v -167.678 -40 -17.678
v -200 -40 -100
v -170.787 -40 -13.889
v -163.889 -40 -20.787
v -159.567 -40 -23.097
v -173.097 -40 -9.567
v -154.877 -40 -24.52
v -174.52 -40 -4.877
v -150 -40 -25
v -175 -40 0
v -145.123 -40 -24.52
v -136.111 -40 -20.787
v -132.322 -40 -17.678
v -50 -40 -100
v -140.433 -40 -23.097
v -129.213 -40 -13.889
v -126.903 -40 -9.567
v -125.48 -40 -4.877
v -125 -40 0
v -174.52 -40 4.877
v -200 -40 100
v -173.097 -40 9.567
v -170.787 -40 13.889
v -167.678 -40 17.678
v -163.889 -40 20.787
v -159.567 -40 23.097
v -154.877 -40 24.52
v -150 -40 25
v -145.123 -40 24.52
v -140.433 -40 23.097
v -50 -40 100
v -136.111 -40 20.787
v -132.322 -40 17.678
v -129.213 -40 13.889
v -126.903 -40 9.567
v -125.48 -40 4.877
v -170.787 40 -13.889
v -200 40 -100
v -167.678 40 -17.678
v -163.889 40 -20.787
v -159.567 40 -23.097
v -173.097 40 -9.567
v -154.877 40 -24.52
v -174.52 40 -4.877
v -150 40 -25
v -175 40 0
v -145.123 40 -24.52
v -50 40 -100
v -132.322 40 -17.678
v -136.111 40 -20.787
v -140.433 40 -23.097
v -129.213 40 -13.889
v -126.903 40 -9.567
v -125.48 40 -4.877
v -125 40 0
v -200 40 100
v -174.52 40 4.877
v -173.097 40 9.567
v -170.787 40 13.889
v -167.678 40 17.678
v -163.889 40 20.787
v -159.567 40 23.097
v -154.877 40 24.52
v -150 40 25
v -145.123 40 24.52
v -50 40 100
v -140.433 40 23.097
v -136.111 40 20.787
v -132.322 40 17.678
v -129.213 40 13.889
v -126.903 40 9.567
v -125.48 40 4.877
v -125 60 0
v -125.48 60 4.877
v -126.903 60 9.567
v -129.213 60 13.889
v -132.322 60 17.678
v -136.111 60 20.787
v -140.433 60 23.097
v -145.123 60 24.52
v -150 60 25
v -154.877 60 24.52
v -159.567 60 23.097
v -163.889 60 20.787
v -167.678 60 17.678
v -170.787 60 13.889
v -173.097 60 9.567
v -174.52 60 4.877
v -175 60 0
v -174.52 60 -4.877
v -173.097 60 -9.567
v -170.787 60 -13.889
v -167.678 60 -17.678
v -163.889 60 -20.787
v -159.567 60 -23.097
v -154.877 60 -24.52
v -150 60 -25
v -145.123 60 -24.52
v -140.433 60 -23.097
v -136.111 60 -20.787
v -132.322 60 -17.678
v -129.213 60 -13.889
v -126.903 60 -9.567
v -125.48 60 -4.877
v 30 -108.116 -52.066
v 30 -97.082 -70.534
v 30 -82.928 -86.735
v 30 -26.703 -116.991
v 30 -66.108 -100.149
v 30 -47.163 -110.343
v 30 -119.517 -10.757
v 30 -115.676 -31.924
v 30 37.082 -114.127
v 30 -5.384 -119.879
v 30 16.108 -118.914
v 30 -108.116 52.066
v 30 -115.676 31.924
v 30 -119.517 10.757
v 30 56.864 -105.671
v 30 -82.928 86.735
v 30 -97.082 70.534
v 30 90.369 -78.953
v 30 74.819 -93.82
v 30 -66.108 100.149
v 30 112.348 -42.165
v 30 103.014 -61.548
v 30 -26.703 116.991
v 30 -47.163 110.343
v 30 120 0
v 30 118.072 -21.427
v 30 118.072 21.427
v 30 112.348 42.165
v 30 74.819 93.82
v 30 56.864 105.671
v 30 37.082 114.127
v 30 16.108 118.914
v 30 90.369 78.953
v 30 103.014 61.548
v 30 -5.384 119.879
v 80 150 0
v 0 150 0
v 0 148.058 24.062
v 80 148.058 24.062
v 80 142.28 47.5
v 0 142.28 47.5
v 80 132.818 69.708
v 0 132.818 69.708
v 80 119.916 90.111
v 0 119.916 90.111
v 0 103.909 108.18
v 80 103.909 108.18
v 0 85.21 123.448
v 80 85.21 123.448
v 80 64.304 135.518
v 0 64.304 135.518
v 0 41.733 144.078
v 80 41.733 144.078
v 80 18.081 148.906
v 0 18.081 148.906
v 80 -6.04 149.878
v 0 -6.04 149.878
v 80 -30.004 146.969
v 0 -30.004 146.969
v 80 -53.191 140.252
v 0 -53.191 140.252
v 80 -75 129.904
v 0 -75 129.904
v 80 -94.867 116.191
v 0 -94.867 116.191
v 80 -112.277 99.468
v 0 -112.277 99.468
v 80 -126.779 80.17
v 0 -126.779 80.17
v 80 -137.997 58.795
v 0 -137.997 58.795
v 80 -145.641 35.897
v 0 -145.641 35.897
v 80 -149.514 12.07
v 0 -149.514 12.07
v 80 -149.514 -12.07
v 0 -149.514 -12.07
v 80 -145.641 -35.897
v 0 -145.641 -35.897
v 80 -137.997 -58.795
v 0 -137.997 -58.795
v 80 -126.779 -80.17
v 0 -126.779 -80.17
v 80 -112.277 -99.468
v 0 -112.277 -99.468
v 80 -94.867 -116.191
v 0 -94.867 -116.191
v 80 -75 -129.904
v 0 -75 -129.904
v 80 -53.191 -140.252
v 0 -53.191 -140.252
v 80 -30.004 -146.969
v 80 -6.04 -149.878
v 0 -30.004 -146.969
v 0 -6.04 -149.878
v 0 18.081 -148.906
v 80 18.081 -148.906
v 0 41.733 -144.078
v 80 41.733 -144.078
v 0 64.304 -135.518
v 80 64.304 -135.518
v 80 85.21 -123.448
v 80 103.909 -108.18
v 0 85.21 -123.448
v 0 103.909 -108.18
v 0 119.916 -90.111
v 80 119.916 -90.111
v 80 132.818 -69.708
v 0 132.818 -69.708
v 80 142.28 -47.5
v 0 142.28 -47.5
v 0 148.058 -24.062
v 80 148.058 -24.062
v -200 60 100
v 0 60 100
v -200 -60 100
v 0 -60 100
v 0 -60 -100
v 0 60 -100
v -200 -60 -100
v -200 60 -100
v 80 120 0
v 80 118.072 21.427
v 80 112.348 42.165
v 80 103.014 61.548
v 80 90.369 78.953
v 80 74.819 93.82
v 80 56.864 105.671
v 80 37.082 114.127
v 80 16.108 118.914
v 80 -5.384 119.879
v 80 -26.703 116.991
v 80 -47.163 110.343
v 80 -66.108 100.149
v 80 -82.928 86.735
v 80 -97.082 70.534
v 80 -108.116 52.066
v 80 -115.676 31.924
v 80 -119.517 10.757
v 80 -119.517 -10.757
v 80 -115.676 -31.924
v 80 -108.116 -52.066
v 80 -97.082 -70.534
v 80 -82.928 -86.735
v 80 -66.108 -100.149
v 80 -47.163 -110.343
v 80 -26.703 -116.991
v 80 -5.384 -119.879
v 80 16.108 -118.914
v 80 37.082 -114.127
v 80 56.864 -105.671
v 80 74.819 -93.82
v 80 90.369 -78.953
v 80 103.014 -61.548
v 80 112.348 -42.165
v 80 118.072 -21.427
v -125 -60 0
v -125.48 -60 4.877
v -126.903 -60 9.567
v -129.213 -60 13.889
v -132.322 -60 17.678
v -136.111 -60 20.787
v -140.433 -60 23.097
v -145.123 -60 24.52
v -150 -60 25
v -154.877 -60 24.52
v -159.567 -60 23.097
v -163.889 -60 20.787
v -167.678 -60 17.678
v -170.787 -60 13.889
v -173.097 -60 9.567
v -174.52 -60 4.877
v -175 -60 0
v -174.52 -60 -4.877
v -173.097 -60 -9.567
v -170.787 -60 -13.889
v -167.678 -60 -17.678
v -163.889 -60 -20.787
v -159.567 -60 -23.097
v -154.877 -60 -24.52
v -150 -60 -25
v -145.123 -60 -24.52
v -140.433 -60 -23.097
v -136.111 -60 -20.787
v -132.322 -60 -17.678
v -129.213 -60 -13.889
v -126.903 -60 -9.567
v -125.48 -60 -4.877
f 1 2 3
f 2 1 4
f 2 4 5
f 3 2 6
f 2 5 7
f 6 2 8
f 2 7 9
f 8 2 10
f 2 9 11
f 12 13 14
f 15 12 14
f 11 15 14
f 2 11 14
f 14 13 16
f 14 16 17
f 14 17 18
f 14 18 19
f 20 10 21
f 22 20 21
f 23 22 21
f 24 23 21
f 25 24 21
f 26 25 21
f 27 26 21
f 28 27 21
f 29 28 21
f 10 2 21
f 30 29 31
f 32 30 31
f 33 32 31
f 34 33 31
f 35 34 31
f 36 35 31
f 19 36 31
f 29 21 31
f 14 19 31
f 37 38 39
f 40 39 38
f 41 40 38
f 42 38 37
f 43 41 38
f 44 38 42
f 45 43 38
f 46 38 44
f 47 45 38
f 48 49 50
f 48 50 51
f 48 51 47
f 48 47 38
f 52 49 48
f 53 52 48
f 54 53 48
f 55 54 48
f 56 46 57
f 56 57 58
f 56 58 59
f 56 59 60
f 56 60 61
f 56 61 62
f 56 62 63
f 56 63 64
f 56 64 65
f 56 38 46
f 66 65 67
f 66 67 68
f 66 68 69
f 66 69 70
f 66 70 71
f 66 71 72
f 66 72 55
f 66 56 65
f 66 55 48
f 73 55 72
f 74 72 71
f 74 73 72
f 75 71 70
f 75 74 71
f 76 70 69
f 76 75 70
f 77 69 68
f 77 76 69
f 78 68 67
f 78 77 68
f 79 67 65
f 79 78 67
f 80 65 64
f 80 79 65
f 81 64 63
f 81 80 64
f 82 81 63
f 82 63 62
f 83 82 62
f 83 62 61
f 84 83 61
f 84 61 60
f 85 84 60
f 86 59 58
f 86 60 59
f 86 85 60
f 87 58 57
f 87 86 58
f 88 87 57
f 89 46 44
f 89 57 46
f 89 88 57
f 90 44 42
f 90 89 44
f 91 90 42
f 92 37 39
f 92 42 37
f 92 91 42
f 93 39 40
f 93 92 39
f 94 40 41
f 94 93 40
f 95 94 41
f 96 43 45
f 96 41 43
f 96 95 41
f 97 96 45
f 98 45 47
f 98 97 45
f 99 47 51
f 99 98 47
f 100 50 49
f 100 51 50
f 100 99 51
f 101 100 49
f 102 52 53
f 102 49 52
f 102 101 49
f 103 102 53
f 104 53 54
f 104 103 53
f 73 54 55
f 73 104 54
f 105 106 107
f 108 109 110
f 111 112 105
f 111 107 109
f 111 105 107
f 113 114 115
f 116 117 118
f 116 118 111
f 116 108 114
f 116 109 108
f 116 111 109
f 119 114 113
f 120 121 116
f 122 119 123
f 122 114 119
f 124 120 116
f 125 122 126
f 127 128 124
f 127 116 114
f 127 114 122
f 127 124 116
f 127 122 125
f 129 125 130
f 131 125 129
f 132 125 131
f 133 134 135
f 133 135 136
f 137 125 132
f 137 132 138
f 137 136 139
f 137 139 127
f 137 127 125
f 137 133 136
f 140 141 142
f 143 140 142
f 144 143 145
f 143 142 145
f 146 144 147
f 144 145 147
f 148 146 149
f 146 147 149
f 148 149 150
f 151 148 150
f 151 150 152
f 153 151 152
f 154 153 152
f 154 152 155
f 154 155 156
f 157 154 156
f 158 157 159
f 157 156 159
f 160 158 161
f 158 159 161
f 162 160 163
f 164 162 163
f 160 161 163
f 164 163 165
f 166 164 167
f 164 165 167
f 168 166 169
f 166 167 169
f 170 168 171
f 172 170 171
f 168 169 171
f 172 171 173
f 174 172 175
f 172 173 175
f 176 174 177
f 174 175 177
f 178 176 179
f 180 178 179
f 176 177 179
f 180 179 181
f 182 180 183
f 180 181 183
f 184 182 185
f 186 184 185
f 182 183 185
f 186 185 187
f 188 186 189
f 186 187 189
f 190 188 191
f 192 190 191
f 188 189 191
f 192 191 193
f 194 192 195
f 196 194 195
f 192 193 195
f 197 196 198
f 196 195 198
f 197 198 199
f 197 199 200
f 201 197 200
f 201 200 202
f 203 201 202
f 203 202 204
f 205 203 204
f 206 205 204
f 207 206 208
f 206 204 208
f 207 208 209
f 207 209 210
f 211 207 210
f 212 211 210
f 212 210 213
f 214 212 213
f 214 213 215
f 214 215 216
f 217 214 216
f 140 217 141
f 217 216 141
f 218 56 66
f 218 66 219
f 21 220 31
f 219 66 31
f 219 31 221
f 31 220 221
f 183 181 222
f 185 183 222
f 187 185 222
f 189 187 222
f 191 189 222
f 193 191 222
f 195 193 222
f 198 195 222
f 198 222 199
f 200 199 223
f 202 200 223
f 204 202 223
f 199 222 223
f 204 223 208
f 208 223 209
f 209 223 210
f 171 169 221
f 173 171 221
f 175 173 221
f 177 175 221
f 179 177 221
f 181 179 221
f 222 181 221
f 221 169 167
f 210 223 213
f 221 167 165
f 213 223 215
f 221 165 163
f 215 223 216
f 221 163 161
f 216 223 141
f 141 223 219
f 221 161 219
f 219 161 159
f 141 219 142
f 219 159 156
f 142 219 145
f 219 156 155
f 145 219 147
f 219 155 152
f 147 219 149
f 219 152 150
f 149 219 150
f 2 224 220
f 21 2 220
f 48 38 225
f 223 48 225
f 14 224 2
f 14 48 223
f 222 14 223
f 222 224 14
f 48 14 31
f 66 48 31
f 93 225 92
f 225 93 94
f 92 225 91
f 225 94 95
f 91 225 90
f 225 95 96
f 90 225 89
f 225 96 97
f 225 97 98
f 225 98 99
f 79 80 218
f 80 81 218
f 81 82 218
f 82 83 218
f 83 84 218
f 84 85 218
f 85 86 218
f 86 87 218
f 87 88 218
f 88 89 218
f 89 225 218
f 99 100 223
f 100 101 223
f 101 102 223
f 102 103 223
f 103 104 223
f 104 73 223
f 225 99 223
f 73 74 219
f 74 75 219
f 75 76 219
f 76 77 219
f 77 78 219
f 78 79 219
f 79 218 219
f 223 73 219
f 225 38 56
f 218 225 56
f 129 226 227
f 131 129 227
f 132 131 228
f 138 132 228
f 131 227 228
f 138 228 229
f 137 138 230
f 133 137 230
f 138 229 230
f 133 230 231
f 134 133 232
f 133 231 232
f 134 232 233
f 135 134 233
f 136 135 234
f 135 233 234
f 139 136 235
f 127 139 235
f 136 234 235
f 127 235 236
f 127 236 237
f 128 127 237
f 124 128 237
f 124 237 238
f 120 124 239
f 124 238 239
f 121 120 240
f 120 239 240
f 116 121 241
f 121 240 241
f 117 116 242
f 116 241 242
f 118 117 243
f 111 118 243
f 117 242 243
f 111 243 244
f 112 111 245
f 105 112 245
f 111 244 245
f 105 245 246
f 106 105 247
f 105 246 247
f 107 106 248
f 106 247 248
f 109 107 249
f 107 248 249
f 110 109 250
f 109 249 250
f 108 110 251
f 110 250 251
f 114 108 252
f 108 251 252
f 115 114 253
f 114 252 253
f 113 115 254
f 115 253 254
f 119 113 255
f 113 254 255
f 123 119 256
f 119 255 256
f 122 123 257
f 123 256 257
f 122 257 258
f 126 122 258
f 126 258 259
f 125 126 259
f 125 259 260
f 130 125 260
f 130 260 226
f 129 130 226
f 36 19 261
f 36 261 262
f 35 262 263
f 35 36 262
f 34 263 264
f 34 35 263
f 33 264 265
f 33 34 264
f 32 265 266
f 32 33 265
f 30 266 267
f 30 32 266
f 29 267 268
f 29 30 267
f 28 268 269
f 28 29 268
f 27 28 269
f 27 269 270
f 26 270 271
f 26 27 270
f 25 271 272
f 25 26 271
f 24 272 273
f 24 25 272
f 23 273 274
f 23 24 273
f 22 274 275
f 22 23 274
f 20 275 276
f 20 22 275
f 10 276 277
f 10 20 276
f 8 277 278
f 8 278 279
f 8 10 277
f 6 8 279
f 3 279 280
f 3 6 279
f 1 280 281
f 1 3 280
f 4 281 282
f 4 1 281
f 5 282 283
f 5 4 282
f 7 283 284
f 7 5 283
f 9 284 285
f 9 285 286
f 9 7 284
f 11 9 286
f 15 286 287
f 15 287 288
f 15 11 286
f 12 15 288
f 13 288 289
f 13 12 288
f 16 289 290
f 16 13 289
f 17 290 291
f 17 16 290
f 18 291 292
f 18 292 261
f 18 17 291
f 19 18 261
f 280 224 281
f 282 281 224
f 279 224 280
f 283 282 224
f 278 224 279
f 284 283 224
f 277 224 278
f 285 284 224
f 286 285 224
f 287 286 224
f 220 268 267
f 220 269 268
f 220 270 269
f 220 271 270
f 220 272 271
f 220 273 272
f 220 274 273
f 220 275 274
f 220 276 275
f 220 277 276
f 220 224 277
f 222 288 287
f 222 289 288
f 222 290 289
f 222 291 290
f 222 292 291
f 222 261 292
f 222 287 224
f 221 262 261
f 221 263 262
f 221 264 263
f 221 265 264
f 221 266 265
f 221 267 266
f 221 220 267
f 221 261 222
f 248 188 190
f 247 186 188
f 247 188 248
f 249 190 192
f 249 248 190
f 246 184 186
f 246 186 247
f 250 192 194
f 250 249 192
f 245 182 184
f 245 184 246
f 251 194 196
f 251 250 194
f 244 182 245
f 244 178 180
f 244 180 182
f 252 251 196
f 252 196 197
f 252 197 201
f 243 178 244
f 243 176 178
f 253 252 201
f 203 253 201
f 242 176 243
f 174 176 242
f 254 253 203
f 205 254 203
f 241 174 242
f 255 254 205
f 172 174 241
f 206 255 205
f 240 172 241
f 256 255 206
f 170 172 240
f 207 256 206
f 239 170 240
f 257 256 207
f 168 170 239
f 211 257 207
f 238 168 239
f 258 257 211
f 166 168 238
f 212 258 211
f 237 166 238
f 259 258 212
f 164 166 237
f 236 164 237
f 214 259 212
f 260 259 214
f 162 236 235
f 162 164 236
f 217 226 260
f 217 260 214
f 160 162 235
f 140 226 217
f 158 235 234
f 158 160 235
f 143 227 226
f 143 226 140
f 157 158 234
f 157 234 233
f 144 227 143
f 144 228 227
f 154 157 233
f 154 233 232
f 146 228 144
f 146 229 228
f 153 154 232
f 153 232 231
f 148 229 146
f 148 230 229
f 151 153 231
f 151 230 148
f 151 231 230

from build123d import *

# Parameters (mm, degrees)
F0_W     = 200
F0_H     = 200
F0_R     = 25
F1_DEPTH = 60
F2_W     = 150
F2_H     = 200
F3_DEPTH = 40
F4_R     = 150
F5_DEPTH = 80
F6_R     = 120
F7_DEPTH = 50


with BuildPart() as f1:
    # F0 (on Front) → F1 (new body, symmetric)
    with BuildSketch(Plane.XZ):
        with Locations((-100, 0)):
            Rectangle(F0_W, F0_H)
        with Locations((-150, 0)):
            Circle(F0_R, mode=Mode.SUBTRACT)
    extrude(amount=F1_DEPTH, both=True)

    # F2 (on Front) → F3 (cut, symmetric)
    with BuildSketch(Plane.XZ):
        with Locations((-125, 0)):
            Rectangle(F2_W, F2_H)
    extrude(amount=F3_DEPTH, both=True, mode=Mode.SUBTRACT)

    # F4 (on face) → F5 (join)
    with BuildSketch(Plane.YZ):
        Circle(F4_R)
    extrude(amount=F5_DEPTH)

    # F6 (on face) → F7 (cut)
    with BuildSketch(Plane.YZ.offset(80)):
        Circle(F6_R)
    extrude(amount=-F7_DEPTH, mode=Mode.SUBTRACT)


solid = f1.part
